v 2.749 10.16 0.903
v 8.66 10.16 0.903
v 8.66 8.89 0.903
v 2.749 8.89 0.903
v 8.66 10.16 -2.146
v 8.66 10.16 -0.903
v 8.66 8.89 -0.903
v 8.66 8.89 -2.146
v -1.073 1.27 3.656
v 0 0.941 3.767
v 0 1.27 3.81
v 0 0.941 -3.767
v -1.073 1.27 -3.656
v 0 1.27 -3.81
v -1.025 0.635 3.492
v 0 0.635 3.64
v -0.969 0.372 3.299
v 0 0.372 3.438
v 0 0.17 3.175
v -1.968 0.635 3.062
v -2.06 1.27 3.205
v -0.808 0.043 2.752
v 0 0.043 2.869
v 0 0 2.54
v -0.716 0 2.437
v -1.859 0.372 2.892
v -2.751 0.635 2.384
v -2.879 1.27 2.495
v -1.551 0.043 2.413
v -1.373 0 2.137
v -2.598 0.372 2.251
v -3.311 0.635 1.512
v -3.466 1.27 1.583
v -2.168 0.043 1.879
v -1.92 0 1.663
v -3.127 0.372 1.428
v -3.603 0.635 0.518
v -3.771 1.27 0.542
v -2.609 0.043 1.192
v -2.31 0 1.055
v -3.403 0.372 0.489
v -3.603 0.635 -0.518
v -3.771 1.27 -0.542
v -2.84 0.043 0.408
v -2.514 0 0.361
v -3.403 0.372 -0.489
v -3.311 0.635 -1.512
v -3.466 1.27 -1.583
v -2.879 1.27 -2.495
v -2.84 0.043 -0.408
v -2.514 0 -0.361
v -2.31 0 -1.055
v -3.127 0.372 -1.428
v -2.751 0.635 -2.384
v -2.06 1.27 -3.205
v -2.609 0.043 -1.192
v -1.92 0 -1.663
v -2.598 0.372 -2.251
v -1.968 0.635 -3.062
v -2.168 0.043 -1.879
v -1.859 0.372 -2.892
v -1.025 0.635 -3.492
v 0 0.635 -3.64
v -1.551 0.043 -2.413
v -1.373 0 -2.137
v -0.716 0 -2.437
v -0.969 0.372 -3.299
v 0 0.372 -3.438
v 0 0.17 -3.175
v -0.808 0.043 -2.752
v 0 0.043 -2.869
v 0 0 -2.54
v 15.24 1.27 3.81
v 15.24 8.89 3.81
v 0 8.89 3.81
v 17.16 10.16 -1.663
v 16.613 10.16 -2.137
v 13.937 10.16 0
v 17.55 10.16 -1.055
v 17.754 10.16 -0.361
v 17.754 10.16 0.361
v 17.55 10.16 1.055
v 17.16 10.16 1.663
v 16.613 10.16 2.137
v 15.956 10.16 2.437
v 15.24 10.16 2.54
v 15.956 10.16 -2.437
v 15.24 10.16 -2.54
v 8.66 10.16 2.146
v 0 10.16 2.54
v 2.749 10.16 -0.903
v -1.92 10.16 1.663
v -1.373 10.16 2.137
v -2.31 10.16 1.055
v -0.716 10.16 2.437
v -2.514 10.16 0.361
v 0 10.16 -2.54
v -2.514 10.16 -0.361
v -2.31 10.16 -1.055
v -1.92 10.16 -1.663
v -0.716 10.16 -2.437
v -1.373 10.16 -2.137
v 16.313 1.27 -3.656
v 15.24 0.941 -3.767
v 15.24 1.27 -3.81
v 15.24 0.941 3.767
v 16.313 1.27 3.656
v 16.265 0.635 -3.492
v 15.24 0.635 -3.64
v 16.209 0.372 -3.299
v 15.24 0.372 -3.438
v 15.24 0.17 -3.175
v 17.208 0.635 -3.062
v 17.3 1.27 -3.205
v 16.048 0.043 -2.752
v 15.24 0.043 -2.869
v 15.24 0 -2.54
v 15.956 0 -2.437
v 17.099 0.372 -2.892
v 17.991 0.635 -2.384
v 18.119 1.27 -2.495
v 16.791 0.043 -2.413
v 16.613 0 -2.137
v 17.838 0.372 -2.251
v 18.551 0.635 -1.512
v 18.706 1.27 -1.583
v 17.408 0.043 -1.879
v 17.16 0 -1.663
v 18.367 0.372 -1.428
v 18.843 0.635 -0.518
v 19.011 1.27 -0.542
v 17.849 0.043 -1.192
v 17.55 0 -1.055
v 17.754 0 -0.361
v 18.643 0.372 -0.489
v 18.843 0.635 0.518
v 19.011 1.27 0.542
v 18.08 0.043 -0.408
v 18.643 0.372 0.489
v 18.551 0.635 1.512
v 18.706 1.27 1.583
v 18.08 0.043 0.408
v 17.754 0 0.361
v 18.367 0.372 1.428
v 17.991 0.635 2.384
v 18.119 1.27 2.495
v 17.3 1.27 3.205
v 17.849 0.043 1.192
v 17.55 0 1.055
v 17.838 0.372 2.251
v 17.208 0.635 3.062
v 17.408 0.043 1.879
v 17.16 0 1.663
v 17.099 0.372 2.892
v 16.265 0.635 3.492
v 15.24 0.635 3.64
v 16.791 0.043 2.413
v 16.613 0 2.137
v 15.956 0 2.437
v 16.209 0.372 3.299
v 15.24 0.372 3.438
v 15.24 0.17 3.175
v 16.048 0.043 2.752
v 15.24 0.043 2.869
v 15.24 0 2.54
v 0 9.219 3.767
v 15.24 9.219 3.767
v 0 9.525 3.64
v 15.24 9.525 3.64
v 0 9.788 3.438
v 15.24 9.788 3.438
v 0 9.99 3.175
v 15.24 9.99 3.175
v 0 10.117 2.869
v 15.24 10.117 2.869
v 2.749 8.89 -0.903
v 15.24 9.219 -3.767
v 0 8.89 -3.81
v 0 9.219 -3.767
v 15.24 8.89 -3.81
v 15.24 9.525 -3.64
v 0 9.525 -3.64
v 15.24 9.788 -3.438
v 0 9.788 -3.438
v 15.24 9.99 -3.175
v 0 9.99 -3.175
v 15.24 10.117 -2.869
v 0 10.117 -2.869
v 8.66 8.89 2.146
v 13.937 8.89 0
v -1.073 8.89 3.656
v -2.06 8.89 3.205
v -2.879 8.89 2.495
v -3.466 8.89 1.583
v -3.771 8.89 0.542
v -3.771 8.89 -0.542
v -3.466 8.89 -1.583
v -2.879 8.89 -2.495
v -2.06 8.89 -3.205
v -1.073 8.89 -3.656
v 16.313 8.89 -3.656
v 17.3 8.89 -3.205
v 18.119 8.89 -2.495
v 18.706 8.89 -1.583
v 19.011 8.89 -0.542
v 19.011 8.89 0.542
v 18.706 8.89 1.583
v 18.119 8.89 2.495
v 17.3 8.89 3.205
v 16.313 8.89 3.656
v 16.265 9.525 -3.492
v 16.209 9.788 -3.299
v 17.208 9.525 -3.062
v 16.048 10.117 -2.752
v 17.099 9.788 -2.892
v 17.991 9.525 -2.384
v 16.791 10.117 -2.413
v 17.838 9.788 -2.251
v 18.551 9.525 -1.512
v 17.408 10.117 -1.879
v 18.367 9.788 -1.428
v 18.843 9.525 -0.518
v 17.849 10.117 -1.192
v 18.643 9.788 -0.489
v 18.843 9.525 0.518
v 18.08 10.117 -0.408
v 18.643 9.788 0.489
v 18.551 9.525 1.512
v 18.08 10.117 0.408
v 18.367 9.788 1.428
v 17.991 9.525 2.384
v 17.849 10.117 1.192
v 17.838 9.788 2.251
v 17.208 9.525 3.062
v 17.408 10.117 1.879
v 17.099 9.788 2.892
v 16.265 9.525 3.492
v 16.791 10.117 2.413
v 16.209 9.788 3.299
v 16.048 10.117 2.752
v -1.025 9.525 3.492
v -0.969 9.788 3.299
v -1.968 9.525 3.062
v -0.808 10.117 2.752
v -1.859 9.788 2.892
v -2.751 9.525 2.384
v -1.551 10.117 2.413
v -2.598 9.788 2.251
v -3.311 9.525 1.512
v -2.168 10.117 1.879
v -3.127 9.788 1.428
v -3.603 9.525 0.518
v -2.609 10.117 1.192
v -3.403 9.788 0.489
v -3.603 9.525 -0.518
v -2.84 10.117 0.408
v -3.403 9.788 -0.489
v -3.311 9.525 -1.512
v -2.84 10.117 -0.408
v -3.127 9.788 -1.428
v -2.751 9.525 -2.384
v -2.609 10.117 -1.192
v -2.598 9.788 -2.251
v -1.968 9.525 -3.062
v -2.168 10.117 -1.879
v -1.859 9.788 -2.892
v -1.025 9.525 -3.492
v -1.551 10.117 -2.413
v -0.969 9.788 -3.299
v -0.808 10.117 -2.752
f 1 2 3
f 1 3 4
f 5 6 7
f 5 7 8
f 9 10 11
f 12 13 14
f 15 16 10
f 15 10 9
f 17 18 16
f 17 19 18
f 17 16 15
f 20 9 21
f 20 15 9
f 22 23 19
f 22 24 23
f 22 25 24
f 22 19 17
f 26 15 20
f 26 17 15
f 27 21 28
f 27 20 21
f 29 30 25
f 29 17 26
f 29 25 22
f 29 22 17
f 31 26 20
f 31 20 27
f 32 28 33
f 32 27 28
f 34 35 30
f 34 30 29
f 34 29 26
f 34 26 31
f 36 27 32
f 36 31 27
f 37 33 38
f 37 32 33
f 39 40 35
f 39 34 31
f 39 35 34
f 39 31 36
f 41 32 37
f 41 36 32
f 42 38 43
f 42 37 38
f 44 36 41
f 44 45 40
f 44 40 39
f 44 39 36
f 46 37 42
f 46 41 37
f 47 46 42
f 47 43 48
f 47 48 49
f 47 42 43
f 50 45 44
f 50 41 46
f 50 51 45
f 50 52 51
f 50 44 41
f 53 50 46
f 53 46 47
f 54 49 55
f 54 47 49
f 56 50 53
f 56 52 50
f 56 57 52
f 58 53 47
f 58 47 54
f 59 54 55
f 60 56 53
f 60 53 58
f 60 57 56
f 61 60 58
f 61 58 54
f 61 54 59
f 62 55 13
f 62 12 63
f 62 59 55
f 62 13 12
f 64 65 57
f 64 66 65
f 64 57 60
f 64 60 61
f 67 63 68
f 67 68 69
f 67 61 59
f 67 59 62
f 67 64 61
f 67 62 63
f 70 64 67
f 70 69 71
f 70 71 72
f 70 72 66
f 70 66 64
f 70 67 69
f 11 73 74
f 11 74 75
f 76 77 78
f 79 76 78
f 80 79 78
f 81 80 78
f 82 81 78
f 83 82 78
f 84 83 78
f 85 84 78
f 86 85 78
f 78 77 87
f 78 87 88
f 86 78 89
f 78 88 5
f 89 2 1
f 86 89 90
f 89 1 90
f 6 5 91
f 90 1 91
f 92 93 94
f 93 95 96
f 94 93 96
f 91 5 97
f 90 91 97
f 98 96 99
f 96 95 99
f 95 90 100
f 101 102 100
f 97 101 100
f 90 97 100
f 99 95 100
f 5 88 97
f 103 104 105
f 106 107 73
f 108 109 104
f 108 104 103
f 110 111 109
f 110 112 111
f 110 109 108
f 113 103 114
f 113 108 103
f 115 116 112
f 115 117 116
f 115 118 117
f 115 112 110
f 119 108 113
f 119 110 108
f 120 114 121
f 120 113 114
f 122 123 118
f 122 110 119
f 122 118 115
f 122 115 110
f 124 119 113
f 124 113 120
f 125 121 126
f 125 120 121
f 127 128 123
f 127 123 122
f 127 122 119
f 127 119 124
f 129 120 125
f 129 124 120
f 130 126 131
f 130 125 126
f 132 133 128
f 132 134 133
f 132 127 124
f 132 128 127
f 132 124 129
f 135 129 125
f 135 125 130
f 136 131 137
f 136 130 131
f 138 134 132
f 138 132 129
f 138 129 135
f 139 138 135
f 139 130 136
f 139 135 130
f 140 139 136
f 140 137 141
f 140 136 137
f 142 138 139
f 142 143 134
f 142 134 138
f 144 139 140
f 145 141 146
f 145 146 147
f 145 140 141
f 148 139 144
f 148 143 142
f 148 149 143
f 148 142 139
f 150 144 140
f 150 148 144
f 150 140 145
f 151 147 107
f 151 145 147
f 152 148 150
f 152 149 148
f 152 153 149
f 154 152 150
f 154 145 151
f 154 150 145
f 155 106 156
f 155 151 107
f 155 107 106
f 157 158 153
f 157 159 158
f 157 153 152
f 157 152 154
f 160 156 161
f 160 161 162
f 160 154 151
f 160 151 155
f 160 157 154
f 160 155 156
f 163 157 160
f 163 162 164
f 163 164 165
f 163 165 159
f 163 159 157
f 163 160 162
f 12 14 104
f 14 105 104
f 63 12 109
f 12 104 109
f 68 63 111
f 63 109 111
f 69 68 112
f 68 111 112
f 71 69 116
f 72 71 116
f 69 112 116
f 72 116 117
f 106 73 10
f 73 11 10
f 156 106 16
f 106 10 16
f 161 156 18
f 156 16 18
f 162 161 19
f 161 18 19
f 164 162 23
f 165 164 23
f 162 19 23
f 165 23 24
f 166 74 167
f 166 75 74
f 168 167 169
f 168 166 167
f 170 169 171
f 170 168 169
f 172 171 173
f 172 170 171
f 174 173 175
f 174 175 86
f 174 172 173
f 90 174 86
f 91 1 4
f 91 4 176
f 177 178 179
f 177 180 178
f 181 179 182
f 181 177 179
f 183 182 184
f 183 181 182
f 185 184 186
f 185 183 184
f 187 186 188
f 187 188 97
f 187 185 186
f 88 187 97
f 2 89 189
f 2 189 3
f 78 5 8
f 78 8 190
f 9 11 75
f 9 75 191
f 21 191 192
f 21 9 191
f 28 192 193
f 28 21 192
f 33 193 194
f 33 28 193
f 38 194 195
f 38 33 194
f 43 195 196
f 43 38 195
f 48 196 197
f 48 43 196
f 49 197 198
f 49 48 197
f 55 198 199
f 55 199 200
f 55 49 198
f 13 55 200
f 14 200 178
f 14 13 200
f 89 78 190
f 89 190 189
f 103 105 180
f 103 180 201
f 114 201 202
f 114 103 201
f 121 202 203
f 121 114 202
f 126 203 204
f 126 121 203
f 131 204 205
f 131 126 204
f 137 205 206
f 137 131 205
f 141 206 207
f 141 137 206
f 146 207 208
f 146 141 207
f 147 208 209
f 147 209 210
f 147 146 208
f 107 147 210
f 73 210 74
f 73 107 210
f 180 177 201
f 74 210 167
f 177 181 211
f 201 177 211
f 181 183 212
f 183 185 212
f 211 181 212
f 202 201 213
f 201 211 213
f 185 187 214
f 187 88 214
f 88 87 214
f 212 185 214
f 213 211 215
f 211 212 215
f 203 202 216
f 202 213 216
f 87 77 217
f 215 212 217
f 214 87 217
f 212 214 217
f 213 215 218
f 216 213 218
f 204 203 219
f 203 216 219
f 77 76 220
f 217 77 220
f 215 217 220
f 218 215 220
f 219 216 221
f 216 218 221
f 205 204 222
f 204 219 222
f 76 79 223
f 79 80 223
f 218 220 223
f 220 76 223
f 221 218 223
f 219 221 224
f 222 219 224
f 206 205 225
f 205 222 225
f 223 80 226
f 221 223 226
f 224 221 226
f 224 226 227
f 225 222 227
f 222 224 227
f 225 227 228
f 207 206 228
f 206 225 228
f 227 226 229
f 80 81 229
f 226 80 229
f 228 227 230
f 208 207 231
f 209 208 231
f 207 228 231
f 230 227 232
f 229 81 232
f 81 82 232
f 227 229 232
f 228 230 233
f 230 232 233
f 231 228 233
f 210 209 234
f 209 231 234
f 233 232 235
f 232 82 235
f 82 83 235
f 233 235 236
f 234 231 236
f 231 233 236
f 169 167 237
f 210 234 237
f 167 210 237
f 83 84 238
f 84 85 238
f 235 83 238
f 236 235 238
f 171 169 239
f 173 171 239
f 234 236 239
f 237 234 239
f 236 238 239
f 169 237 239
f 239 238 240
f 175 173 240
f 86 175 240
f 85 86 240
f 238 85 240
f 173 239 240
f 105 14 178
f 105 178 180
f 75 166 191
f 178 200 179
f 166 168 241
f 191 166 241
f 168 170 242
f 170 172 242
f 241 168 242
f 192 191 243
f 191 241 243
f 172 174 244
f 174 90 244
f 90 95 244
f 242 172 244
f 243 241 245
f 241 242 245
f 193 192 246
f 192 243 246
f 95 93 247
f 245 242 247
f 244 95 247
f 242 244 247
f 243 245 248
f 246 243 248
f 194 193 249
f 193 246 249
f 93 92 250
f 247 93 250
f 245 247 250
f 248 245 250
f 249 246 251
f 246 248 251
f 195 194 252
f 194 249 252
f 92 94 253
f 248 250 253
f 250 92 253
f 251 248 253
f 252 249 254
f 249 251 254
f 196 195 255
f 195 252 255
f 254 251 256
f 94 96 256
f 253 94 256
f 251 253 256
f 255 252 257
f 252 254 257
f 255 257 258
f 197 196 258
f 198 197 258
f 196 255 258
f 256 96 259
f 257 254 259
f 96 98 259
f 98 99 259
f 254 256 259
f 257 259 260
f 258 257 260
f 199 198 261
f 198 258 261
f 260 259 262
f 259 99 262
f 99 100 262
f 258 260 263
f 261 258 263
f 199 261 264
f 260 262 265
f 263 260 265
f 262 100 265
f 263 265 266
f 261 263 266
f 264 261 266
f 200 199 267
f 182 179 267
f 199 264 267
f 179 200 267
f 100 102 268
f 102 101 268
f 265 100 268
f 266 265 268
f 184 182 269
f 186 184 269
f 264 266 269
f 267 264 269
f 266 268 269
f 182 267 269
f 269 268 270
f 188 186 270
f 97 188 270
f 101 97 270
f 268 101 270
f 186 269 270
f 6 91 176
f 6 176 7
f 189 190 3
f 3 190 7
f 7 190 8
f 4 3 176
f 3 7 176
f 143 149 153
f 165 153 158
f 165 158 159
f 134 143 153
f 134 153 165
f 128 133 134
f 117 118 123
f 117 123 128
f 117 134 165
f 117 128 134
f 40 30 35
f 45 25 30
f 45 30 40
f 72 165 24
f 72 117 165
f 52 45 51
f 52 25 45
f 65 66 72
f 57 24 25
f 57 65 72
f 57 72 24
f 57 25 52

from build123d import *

# Parameters (mm, degrees)
BOSS_EXTRUDE1_DEPTH = 10.16
CUT_EXTRUDE1_DEPTH  = 1.27
FILLET2_R           = 1.27
FILLET3_R           = 1.27


with BuildPart() as part:
    # Sketch1 → Boss-Extrude1 (new body)
    with BuildSketch(Plane(origin=(0, 0, 0), x_dir=(1, 0, 0), z_dir=(0, 1, 0))):
        with BuildLine():
            Line((0, 3.81), (15.24, 3.81))
            ThreePointArc((15.24, 3.81), (19.05, 0), (15.24, -3.81))
            Line((15.24, -3.81), (0, -3.81))
            ThreePointArc((0, -3.81), (-3.81, 0), (0, 3.81))
        make_face()
    extrude(amount=BOSS_EXTRUDE1_DEPTH)

    # Sketch2 → Cut-Extrude1 (cut)
    with BuildSketch(Plane(origin=(0, 10.16, 0), x_dir=(1, 0, 0), z_dir=(0, 1, 0))):
        Polygon((2.748829604, -0.902510302), (2.748829604, 0.902510302), (8.660197845, 0.902510302), (8.660197845, 2.14567358), (13.937299107, 0), (8.660197845, -2.14567358), (8.660197845, -0.902510302), align=None)
    extrude(amount=-CUT_EXTRUDE1_DEPTH, mode=Mode.SUBTRACT)

    # Fillet2
    fillet2_edges = [part.edges().sort_by_distance(p)[0] for p in [
        (19.05, 10.16, 0),
        (7.62, 10.16, -3.81),
        (-3.81, 10.16, 0),
        (7.62, 10.16, 3.81),
    ]]
    fillet(fillet2_edges, radius=FILLET2_R)

    # Fillet3
    fillet3_edges = [part.edges().sort_by_distance(p)[0] for p in [
        (7.62, 0, -3.81),
        (19.05, 0, 0),
        (7.62, 0, 3.81),
        (-3.81, 0, 0),
    ]]
    fillet(fillet3_edges, radius=FILLET3_R)


solid = part.part
